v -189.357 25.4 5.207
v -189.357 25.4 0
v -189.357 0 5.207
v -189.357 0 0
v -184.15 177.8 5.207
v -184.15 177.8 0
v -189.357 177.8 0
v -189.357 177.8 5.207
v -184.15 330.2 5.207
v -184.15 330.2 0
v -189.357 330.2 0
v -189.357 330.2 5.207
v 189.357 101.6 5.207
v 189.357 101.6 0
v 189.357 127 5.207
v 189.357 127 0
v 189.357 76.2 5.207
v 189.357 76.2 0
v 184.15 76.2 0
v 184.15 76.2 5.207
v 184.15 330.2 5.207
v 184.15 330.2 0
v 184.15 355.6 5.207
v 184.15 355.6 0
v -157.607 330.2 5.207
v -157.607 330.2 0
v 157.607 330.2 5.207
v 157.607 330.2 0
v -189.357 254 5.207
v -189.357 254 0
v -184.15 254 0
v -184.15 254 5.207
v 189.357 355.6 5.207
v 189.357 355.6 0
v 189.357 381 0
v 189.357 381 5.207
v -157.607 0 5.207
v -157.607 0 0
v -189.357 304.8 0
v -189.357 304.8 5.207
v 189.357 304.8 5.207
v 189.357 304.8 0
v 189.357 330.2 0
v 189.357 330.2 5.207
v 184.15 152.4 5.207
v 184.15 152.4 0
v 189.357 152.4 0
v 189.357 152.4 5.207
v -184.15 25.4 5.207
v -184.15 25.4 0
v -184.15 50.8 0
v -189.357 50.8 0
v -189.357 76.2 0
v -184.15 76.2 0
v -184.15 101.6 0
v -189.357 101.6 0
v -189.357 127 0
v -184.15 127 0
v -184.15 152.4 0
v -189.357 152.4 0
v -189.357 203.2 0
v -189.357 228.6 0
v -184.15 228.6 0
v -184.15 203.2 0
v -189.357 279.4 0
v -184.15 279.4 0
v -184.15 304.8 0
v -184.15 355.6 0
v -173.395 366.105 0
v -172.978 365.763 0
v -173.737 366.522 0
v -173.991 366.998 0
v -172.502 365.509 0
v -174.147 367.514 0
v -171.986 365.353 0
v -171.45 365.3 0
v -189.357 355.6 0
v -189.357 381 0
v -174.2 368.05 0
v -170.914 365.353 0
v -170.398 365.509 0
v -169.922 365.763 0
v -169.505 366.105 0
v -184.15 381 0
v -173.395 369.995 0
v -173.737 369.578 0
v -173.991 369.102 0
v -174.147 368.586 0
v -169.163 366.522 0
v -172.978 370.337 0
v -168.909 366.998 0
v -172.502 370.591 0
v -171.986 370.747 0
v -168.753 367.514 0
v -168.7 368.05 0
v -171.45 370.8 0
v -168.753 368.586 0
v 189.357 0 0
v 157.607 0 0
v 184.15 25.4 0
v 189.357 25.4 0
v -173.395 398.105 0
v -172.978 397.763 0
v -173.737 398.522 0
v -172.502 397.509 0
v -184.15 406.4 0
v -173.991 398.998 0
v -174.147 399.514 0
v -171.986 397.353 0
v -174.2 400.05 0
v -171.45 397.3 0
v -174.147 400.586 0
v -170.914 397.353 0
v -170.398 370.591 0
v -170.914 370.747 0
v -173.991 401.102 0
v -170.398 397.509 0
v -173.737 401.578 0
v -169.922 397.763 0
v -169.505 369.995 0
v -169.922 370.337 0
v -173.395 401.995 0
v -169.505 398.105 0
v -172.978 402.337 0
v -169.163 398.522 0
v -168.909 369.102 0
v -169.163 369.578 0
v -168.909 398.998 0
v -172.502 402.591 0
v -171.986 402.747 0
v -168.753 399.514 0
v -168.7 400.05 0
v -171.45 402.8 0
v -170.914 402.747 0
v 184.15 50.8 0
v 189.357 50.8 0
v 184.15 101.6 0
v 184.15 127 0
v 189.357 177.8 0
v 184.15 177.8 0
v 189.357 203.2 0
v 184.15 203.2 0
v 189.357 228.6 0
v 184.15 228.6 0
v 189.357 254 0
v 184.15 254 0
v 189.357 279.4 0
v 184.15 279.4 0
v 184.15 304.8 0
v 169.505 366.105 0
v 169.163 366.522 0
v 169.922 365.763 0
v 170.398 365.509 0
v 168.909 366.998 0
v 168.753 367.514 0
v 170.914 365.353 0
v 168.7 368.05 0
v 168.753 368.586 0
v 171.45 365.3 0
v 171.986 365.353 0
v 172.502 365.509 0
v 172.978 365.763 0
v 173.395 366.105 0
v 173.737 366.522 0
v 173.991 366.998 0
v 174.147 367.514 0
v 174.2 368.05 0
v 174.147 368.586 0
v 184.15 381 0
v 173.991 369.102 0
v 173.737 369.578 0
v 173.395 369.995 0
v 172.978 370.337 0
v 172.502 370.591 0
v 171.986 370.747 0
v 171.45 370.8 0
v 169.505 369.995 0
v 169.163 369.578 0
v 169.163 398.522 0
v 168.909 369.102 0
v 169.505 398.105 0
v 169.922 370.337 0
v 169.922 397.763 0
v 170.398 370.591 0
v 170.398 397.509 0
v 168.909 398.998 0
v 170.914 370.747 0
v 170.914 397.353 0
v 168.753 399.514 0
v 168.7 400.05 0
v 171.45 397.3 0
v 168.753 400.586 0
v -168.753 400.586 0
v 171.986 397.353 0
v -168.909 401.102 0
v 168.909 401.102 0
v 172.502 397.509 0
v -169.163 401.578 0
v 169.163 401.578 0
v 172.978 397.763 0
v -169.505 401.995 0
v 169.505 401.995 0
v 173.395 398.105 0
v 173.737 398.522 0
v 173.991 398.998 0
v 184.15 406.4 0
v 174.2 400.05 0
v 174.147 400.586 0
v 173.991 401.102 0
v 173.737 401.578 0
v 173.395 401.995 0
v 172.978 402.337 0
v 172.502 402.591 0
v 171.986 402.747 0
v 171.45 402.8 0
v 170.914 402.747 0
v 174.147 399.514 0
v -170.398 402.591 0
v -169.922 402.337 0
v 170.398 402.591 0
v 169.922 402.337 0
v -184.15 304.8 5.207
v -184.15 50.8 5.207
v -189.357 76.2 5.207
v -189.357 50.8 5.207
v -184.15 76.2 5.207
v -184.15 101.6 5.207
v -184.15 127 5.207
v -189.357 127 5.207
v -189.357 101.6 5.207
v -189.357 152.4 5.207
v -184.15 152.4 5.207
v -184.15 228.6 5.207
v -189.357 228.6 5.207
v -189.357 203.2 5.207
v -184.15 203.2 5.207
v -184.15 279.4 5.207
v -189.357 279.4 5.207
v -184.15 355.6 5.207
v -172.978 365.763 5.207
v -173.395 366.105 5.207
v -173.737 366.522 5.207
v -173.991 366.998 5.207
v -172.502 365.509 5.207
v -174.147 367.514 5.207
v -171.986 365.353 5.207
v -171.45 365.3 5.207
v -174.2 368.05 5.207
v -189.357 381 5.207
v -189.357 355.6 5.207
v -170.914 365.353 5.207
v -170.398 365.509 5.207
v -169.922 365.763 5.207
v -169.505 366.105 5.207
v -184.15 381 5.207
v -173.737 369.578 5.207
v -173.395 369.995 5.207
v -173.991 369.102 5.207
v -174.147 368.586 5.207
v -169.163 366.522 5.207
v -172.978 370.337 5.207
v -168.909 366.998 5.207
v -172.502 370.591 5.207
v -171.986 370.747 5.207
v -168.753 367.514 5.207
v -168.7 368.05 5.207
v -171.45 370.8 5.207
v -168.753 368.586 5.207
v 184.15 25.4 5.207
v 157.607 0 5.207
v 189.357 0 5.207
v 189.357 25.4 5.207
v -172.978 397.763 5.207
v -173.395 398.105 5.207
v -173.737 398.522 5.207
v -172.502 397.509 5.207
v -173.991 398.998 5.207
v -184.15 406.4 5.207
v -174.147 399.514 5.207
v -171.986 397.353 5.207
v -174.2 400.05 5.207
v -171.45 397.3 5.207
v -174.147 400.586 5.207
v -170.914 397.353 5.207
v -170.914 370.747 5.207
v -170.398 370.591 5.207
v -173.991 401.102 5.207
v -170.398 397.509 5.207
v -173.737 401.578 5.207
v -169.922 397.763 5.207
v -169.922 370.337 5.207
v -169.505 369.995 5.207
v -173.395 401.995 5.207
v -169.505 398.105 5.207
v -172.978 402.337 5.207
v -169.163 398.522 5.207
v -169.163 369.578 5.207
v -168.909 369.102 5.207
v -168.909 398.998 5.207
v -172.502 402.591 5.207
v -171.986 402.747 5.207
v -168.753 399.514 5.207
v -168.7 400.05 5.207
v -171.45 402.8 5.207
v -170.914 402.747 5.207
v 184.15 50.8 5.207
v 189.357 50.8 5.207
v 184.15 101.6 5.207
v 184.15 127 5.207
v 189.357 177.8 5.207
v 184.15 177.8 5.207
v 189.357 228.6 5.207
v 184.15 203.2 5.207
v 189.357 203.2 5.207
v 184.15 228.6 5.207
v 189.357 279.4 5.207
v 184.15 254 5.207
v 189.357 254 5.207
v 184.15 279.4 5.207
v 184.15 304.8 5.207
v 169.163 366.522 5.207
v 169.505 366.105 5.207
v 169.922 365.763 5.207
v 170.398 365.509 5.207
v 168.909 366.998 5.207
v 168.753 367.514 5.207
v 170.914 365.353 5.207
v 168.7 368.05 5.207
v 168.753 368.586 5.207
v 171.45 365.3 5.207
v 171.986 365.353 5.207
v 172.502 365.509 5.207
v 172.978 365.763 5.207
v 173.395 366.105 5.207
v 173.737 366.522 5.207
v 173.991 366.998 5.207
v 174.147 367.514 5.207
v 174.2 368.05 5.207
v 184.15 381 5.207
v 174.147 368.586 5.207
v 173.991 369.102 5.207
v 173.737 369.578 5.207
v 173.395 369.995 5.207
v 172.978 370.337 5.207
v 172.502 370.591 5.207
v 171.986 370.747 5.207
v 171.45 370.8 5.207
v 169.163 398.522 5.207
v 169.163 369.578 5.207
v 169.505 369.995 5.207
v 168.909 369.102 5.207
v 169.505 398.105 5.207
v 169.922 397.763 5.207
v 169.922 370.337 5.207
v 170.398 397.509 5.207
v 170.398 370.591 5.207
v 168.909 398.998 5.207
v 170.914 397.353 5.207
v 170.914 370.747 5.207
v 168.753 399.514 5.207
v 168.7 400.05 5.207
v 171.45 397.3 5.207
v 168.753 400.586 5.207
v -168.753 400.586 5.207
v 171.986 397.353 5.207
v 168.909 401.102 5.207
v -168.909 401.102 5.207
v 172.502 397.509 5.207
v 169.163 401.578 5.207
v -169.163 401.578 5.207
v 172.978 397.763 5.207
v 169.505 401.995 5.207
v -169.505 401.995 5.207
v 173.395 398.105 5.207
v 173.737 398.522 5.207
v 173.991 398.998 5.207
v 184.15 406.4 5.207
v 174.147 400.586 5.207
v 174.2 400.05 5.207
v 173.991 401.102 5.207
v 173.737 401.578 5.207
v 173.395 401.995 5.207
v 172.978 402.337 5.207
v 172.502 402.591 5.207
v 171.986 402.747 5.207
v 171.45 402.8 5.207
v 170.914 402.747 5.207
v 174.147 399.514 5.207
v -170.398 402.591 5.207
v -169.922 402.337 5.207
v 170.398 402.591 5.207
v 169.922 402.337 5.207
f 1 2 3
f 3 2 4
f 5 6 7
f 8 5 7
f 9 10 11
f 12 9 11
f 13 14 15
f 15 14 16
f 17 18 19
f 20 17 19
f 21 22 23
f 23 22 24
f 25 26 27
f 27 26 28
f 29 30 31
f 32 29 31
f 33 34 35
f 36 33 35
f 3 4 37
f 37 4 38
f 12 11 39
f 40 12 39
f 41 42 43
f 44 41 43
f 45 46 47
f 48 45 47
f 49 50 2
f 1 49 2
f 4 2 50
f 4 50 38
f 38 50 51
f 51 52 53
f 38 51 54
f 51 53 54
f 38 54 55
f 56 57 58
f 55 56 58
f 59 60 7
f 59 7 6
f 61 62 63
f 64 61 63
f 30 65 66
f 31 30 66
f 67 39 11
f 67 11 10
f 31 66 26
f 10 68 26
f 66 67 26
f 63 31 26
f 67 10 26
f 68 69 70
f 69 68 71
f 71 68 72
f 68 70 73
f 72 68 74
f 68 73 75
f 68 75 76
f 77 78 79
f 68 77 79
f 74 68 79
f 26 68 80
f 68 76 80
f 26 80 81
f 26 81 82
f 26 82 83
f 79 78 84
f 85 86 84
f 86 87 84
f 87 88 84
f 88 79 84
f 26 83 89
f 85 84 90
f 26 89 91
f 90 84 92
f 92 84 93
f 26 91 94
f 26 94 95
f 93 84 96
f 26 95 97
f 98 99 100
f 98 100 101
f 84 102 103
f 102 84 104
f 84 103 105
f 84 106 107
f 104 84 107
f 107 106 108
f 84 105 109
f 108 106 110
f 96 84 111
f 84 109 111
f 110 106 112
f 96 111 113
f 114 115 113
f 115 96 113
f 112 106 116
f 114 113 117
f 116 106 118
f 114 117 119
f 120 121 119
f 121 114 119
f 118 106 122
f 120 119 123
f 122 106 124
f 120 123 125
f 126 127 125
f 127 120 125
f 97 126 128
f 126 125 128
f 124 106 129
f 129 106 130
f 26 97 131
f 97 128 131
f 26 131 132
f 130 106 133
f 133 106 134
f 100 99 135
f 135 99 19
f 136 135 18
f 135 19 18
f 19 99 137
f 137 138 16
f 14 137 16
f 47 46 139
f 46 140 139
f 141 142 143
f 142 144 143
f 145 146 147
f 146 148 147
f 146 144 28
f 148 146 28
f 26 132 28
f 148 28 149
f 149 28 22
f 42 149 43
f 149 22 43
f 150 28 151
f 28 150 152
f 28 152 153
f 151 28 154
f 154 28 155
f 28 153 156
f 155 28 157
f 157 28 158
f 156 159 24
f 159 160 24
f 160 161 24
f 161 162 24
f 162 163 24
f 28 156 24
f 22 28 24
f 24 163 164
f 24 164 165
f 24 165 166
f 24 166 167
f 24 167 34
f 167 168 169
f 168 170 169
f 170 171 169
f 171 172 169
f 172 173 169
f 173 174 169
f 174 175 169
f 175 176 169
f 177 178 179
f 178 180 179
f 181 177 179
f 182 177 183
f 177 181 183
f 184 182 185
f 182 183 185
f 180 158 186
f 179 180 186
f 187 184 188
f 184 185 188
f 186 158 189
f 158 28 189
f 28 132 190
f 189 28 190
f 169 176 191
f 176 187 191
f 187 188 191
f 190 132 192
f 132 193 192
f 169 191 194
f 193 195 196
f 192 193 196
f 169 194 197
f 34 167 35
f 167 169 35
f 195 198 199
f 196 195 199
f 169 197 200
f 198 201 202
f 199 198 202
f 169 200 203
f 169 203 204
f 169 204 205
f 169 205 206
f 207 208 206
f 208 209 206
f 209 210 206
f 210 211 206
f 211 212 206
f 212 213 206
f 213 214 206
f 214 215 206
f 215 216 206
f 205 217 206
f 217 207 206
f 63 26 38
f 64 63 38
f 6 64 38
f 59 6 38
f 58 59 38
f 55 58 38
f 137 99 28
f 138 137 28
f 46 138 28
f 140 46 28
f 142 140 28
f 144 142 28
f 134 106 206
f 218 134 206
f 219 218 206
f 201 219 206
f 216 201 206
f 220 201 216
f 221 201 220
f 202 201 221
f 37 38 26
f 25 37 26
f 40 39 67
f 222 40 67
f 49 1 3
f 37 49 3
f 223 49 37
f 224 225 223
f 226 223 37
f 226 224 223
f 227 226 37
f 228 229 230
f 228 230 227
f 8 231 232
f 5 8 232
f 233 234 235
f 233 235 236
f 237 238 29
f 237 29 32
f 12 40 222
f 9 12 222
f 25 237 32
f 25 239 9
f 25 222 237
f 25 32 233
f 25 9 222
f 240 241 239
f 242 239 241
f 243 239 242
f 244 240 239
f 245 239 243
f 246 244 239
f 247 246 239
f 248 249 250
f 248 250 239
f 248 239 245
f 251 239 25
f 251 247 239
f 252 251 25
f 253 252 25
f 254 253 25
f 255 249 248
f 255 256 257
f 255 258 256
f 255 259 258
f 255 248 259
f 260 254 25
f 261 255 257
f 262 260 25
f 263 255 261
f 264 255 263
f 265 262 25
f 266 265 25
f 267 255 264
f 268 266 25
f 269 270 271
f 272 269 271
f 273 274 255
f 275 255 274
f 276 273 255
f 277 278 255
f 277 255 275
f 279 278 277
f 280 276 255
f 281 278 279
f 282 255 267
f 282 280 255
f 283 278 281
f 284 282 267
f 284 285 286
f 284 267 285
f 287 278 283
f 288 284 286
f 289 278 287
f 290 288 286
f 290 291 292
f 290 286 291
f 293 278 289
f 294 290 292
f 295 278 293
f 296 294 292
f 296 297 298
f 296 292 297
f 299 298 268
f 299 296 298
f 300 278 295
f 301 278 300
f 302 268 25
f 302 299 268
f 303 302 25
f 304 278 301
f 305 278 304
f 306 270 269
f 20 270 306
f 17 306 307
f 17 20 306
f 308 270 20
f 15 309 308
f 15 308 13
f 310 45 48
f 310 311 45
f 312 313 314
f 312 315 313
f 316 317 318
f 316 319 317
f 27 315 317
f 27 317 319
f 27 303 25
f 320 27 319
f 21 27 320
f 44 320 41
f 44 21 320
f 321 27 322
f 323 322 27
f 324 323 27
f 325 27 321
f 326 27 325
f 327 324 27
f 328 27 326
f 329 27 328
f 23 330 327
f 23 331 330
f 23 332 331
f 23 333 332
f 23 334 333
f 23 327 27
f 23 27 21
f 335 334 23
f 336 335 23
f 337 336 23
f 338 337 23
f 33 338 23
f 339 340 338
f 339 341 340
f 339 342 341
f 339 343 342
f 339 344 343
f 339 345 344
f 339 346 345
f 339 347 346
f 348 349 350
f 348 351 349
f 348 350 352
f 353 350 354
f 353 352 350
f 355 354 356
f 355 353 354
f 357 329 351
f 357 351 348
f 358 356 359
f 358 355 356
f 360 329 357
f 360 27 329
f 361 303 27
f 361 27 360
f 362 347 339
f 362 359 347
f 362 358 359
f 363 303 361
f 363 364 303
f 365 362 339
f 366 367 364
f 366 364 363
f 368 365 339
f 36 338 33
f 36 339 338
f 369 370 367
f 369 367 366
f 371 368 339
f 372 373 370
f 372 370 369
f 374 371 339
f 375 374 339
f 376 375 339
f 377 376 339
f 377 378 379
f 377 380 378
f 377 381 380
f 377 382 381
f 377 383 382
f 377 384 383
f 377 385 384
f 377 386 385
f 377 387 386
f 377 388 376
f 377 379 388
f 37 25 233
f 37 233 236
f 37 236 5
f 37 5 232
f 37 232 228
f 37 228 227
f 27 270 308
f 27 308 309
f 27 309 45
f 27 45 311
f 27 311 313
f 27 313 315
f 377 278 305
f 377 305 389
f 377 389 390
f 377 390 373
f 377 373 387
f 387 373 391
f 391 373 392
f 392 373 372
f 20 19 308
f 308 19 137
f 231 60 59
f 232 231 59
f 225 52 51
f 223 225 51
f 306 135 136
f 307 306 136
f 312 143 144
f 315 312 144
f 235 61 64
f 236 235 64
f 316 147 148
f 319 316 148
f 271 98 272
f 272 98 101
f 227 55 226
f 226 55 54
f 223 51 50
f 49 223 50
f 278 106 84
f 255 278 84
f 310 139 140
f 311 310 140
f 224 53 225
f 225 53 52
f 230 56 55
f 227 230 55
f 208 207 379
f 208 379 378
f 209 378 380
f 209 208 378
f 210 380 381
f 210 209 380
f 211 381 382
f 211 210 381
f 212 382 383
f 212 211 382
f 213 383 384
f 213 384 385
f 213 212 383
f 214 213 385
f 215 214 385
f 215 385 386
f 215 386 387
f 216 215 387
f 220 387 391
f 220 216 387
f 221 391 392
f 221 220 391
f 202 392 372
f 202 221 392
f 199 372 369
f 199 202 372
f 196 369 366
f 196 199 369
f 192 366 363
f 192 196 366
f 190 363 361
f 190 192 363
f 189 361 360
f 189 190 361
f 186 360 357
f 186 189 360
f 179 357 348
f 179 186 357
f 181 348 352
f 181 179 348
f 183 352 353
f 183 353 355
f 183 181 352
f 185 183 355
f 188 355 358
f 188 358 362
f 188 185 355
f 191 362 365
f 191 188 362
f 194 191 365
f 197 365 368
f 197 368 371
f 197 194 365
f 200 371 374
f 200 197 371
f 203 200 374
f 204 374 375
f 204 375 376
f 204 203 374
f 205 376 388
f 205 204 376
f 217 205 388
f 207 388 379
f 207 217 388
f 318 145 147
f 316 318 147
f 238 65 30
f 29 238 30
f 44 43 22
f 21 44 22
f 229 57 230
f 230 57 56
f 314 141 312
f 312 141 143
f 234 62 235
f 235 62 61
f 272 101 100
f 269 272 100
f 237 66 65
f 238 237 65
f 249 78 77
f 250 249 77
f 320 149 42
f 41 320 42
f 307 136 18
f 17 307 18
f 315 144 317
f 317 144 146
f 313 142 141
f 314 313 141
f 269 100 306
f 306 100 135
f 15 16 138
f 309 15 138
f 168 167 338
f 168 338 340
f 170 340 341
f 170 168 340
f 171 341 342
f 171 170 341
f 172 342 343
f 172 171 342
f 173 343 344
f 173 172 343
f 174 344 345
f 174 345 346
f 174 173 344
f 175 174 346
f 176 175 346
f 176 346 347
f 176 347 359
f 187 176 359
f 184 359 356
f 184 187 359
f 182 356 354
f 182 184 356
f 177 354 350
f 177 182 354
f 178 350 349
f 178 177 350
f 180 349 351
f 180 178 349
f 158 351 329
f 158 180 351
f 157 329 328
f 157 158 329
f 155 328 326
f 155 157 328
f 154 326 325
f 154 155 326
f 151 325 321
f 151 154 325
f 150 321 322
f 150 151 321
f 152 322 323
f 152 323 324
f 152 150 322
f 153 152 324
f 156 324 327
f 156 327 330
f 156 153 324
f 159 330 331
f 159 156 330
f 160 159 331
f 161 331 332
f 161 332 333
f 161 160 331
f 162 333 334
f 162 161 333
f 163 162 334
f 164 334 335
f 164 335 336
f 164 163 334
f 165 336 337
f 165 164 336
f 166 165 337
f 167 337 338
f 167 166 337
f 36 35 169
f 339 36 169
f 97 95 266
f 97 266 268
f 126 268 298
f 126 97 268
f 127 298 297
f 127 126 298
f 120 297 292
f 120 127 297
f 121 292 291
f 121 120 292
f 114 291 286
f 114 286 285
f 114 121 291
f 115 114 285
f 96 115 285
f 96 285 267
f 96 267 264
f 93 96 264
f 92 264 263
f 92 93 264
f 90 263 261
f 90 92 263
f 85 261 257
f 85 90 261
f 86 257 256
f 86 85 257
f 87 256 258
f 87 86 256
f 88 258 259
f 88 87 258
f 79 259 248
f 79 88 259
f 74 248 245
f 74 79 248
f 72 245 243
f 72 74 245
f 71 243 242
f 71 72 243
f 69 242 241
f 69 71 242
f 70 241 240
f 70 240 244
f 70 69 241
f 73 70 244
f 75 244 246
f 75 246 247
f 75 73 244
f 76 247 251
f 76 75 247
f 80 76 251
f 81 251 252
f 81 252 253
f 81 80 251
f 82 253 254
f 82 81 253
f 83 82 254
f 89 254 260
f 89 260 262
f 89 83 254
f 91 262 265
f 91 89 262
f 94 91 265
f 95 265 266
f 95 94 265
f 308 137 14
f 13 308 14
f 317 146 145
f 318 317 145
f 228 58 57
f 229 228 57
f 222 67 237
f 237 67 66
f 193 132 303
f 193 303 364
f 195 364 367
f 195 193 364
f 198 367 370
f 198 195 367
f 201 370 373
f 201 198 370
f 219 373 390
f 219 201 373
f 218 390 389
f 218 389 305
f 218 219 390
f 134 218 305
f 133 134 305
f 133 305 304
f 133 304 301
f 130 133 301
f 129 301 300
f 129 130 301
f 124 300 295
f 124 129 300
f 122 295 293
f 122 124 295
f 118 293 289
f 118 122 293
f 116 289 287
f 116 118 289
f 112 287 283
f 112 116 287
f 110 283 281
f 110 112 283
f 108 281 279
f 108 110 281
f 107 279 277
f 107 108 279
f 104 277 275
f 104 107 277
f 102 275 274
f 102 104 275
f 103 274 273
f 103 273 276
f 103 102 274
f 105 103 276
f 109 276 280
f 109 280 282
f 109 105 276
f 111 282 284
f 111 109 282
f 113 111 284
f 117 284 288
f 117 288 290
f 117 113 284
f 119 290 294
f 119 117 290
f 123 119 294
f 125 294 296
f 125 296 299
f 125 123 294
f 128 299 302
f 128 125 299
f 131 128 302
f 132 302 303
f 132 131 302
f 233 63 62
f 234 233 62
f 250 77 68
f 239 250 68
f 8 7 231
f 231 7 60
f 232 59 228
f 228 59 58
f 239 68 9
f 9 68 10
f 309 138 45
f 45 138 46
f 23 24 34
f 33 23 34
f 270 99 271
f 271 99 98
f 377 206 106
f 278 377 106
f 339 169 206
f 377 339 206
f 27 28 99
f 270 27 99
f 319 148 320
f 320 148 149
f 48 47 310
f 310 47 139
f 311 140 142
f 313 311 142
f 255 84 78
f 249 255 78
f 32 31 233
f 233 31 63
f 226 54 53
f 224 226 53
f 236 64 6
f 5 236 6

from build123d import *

# Parameters (mm, degrees)
SKETCH1_R           = 2.75
BOSS_EXTRUDE1_DEPTH = 5.207


with BuildPart() as part:
    # Sketch1 → Boss-Extrude1 (new body)
    with BuildSketch(Plane.XY):
        Polygon((-189.357, 25.4), (-189.357, 0), (-157.607, 0), (-157.607, 330.2), (157.607, 330.2), (157.607, 0), (189.357, 0), (189.357, 25.4), (184.15, 25.4), (184.15, 50.8), (189.357, 50.8), (189.357, 76.2), (184.15, 76.2), (184.15, 101.6), (189.357, 101.6), (189.357, 127), (184.15, 127), (184.15, 152.4), (189.357, 152.4), (189.357, 177.8), (184.15, 177.8), (184.15, 203.2), (189.357, 203.2), (189.357, 228.6), (184.15, 228.6), (184.15, 254), (189.357, 254), (189.357, 279.4), (184.15, 279.4), (184.15, 304.8), (189.357, 304.8), (189.357, 330.2), (184.15, 330.2), (184.15, 355.6), (189.357, 355.6), (189.357, 381), (184.15, 381), (184.15, 406.4), (-184.15, 406.4), (-184.15, 381), (-189.357, 381), (-189.357, 355.6), (-184.15, 355.6), (-184.15, 330.2), (-189.357, 330.2), (-189.357, 304.8), (-184.15, 304.8), (-184.15, 279.4), (-189.357, 279.4), (-189.357, 254), (-184.15, 254), (-184.15, 228.6), (-189.357, 228.6), (-189.357, 203.2), (-184.15, 203.2), (-184.15, 177.8), (-189.357, 177.8), (-189.357, 152.4), (-184.15, 152.4), (-184.15, 127), (-189.357, 127), (-189.357, 101.6), (-184.15, 101.6), (-184.15, 76.2), (-189.357, 76.2), (-189.357, 50.8), (-184.15, 50.8), (-184.15, 25.4), align=None)
        with Locations((-171.45, 368.05)):
            Circle(SKETCH1_R, mode=Mode.SUBTRACT)
        with Locations((-171.45, 400.05)):
            Circle(SKETCH1_R, mode=Mode.SUBTRACT)
        with Locations((171.45, 368.05)):
            Circle(SKETCH1_R, mode=Mode.SUBTRACT)
        with Locations((171.45, 400.05)):
            Circle(SKETCH1_R, mode=Mode.SUBTRACT)
    extrude(amount=BOSS_EXTRUDE1_DEPTH)


solid = part.part
